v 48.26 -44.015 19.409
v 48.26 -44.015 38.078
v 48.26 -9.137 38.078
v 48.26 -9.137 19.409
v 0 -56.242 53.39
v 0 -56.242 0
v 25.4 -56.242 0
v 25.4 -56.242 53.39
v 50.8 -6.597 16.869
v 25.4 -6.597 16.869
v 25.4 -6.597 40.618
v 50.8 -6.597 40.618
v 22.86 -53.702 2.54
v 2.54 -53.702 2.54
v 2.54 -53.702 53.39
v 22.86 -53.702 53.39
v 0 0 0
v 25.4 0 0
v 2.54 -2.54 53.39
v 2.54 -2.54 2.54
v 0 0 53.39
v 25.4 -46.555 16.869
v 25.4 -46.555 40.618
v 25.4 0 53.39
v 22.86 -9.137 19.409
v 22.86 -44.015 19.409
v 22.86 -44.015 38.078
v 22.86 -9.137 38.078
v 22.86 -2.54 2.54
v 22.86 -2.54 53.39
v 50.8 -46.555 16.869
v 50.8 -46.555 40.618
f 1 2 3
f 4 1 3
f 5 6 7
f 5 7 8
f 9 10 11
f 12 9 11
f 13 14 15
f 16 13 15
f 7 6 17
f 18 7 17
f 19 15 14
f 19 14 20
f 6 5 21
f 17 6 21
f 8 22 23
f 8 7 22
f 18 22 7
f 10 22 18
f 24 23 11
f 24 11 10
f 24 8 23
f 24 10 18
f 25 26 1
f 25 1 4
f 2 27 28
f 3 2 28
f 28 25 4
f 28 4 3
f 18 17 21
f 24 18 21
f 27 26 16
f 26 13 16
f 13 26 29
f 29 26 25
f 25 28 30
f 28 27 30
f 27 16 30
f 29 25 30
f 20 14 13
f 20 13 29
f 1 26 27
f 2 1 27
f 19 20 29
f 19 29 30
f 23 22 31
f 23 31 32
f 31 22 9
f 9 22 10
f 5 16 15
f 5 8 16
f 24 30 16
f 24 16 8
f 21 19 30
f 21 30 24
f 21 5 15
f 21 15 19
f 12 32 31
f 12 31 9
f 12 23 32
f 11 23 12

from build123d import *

# Parameters (mm, degrees)
F0_W     = 35.9010435641
F0_H     = 59.8467253149
F1_DEPTH = 25.4
F2_W     = 56.2424324453
F2_H     = 53.3904395998
F3_DEPTH = 25.4
F4_W     = 39.9578805082
F4_H     = 23.749506101
F5_DEPTH = 25.4
F6_T     = -2.54


with BuildPart() as f1:
    # F0 (on Top) → F1 (new body)
    with BuildSketch(Plane.XY):
        with Locations((-17.950521782, 29.9233626574)):
            Rectangle(F0_W, F0_H)
    extrude(amount=F1_DEPTH)


with BuildPart() as f3:
    # F2 (on Right) → F3 (new body)
    with BuildSketch(Plane.YZ):
        with Locations((-28.1212162226, 26.6952197999)):
            Rectangle(F2_W, F2_H)
    extrude(amount=F3_DEPTH)

    # F4 (on face) → F5 (join)
    with BuildSketch(Plane.YZ.offset(25.4)):
        with Locations((-26.5757592861, 28.7435064092)):
            Rectangle(F4_W, F4_H)
    extrude(amount=F5_DEPTH)

    # F6
    f6_openings = [f3.faces().sort_by_distance(p)[0] for p in [
        (12.7, -28.121216, 53.39044),
    ]]
    offset(amount=F6_T, openings=f6_openings, kind=Kind.INTERSECTION)


solid = f3.part
